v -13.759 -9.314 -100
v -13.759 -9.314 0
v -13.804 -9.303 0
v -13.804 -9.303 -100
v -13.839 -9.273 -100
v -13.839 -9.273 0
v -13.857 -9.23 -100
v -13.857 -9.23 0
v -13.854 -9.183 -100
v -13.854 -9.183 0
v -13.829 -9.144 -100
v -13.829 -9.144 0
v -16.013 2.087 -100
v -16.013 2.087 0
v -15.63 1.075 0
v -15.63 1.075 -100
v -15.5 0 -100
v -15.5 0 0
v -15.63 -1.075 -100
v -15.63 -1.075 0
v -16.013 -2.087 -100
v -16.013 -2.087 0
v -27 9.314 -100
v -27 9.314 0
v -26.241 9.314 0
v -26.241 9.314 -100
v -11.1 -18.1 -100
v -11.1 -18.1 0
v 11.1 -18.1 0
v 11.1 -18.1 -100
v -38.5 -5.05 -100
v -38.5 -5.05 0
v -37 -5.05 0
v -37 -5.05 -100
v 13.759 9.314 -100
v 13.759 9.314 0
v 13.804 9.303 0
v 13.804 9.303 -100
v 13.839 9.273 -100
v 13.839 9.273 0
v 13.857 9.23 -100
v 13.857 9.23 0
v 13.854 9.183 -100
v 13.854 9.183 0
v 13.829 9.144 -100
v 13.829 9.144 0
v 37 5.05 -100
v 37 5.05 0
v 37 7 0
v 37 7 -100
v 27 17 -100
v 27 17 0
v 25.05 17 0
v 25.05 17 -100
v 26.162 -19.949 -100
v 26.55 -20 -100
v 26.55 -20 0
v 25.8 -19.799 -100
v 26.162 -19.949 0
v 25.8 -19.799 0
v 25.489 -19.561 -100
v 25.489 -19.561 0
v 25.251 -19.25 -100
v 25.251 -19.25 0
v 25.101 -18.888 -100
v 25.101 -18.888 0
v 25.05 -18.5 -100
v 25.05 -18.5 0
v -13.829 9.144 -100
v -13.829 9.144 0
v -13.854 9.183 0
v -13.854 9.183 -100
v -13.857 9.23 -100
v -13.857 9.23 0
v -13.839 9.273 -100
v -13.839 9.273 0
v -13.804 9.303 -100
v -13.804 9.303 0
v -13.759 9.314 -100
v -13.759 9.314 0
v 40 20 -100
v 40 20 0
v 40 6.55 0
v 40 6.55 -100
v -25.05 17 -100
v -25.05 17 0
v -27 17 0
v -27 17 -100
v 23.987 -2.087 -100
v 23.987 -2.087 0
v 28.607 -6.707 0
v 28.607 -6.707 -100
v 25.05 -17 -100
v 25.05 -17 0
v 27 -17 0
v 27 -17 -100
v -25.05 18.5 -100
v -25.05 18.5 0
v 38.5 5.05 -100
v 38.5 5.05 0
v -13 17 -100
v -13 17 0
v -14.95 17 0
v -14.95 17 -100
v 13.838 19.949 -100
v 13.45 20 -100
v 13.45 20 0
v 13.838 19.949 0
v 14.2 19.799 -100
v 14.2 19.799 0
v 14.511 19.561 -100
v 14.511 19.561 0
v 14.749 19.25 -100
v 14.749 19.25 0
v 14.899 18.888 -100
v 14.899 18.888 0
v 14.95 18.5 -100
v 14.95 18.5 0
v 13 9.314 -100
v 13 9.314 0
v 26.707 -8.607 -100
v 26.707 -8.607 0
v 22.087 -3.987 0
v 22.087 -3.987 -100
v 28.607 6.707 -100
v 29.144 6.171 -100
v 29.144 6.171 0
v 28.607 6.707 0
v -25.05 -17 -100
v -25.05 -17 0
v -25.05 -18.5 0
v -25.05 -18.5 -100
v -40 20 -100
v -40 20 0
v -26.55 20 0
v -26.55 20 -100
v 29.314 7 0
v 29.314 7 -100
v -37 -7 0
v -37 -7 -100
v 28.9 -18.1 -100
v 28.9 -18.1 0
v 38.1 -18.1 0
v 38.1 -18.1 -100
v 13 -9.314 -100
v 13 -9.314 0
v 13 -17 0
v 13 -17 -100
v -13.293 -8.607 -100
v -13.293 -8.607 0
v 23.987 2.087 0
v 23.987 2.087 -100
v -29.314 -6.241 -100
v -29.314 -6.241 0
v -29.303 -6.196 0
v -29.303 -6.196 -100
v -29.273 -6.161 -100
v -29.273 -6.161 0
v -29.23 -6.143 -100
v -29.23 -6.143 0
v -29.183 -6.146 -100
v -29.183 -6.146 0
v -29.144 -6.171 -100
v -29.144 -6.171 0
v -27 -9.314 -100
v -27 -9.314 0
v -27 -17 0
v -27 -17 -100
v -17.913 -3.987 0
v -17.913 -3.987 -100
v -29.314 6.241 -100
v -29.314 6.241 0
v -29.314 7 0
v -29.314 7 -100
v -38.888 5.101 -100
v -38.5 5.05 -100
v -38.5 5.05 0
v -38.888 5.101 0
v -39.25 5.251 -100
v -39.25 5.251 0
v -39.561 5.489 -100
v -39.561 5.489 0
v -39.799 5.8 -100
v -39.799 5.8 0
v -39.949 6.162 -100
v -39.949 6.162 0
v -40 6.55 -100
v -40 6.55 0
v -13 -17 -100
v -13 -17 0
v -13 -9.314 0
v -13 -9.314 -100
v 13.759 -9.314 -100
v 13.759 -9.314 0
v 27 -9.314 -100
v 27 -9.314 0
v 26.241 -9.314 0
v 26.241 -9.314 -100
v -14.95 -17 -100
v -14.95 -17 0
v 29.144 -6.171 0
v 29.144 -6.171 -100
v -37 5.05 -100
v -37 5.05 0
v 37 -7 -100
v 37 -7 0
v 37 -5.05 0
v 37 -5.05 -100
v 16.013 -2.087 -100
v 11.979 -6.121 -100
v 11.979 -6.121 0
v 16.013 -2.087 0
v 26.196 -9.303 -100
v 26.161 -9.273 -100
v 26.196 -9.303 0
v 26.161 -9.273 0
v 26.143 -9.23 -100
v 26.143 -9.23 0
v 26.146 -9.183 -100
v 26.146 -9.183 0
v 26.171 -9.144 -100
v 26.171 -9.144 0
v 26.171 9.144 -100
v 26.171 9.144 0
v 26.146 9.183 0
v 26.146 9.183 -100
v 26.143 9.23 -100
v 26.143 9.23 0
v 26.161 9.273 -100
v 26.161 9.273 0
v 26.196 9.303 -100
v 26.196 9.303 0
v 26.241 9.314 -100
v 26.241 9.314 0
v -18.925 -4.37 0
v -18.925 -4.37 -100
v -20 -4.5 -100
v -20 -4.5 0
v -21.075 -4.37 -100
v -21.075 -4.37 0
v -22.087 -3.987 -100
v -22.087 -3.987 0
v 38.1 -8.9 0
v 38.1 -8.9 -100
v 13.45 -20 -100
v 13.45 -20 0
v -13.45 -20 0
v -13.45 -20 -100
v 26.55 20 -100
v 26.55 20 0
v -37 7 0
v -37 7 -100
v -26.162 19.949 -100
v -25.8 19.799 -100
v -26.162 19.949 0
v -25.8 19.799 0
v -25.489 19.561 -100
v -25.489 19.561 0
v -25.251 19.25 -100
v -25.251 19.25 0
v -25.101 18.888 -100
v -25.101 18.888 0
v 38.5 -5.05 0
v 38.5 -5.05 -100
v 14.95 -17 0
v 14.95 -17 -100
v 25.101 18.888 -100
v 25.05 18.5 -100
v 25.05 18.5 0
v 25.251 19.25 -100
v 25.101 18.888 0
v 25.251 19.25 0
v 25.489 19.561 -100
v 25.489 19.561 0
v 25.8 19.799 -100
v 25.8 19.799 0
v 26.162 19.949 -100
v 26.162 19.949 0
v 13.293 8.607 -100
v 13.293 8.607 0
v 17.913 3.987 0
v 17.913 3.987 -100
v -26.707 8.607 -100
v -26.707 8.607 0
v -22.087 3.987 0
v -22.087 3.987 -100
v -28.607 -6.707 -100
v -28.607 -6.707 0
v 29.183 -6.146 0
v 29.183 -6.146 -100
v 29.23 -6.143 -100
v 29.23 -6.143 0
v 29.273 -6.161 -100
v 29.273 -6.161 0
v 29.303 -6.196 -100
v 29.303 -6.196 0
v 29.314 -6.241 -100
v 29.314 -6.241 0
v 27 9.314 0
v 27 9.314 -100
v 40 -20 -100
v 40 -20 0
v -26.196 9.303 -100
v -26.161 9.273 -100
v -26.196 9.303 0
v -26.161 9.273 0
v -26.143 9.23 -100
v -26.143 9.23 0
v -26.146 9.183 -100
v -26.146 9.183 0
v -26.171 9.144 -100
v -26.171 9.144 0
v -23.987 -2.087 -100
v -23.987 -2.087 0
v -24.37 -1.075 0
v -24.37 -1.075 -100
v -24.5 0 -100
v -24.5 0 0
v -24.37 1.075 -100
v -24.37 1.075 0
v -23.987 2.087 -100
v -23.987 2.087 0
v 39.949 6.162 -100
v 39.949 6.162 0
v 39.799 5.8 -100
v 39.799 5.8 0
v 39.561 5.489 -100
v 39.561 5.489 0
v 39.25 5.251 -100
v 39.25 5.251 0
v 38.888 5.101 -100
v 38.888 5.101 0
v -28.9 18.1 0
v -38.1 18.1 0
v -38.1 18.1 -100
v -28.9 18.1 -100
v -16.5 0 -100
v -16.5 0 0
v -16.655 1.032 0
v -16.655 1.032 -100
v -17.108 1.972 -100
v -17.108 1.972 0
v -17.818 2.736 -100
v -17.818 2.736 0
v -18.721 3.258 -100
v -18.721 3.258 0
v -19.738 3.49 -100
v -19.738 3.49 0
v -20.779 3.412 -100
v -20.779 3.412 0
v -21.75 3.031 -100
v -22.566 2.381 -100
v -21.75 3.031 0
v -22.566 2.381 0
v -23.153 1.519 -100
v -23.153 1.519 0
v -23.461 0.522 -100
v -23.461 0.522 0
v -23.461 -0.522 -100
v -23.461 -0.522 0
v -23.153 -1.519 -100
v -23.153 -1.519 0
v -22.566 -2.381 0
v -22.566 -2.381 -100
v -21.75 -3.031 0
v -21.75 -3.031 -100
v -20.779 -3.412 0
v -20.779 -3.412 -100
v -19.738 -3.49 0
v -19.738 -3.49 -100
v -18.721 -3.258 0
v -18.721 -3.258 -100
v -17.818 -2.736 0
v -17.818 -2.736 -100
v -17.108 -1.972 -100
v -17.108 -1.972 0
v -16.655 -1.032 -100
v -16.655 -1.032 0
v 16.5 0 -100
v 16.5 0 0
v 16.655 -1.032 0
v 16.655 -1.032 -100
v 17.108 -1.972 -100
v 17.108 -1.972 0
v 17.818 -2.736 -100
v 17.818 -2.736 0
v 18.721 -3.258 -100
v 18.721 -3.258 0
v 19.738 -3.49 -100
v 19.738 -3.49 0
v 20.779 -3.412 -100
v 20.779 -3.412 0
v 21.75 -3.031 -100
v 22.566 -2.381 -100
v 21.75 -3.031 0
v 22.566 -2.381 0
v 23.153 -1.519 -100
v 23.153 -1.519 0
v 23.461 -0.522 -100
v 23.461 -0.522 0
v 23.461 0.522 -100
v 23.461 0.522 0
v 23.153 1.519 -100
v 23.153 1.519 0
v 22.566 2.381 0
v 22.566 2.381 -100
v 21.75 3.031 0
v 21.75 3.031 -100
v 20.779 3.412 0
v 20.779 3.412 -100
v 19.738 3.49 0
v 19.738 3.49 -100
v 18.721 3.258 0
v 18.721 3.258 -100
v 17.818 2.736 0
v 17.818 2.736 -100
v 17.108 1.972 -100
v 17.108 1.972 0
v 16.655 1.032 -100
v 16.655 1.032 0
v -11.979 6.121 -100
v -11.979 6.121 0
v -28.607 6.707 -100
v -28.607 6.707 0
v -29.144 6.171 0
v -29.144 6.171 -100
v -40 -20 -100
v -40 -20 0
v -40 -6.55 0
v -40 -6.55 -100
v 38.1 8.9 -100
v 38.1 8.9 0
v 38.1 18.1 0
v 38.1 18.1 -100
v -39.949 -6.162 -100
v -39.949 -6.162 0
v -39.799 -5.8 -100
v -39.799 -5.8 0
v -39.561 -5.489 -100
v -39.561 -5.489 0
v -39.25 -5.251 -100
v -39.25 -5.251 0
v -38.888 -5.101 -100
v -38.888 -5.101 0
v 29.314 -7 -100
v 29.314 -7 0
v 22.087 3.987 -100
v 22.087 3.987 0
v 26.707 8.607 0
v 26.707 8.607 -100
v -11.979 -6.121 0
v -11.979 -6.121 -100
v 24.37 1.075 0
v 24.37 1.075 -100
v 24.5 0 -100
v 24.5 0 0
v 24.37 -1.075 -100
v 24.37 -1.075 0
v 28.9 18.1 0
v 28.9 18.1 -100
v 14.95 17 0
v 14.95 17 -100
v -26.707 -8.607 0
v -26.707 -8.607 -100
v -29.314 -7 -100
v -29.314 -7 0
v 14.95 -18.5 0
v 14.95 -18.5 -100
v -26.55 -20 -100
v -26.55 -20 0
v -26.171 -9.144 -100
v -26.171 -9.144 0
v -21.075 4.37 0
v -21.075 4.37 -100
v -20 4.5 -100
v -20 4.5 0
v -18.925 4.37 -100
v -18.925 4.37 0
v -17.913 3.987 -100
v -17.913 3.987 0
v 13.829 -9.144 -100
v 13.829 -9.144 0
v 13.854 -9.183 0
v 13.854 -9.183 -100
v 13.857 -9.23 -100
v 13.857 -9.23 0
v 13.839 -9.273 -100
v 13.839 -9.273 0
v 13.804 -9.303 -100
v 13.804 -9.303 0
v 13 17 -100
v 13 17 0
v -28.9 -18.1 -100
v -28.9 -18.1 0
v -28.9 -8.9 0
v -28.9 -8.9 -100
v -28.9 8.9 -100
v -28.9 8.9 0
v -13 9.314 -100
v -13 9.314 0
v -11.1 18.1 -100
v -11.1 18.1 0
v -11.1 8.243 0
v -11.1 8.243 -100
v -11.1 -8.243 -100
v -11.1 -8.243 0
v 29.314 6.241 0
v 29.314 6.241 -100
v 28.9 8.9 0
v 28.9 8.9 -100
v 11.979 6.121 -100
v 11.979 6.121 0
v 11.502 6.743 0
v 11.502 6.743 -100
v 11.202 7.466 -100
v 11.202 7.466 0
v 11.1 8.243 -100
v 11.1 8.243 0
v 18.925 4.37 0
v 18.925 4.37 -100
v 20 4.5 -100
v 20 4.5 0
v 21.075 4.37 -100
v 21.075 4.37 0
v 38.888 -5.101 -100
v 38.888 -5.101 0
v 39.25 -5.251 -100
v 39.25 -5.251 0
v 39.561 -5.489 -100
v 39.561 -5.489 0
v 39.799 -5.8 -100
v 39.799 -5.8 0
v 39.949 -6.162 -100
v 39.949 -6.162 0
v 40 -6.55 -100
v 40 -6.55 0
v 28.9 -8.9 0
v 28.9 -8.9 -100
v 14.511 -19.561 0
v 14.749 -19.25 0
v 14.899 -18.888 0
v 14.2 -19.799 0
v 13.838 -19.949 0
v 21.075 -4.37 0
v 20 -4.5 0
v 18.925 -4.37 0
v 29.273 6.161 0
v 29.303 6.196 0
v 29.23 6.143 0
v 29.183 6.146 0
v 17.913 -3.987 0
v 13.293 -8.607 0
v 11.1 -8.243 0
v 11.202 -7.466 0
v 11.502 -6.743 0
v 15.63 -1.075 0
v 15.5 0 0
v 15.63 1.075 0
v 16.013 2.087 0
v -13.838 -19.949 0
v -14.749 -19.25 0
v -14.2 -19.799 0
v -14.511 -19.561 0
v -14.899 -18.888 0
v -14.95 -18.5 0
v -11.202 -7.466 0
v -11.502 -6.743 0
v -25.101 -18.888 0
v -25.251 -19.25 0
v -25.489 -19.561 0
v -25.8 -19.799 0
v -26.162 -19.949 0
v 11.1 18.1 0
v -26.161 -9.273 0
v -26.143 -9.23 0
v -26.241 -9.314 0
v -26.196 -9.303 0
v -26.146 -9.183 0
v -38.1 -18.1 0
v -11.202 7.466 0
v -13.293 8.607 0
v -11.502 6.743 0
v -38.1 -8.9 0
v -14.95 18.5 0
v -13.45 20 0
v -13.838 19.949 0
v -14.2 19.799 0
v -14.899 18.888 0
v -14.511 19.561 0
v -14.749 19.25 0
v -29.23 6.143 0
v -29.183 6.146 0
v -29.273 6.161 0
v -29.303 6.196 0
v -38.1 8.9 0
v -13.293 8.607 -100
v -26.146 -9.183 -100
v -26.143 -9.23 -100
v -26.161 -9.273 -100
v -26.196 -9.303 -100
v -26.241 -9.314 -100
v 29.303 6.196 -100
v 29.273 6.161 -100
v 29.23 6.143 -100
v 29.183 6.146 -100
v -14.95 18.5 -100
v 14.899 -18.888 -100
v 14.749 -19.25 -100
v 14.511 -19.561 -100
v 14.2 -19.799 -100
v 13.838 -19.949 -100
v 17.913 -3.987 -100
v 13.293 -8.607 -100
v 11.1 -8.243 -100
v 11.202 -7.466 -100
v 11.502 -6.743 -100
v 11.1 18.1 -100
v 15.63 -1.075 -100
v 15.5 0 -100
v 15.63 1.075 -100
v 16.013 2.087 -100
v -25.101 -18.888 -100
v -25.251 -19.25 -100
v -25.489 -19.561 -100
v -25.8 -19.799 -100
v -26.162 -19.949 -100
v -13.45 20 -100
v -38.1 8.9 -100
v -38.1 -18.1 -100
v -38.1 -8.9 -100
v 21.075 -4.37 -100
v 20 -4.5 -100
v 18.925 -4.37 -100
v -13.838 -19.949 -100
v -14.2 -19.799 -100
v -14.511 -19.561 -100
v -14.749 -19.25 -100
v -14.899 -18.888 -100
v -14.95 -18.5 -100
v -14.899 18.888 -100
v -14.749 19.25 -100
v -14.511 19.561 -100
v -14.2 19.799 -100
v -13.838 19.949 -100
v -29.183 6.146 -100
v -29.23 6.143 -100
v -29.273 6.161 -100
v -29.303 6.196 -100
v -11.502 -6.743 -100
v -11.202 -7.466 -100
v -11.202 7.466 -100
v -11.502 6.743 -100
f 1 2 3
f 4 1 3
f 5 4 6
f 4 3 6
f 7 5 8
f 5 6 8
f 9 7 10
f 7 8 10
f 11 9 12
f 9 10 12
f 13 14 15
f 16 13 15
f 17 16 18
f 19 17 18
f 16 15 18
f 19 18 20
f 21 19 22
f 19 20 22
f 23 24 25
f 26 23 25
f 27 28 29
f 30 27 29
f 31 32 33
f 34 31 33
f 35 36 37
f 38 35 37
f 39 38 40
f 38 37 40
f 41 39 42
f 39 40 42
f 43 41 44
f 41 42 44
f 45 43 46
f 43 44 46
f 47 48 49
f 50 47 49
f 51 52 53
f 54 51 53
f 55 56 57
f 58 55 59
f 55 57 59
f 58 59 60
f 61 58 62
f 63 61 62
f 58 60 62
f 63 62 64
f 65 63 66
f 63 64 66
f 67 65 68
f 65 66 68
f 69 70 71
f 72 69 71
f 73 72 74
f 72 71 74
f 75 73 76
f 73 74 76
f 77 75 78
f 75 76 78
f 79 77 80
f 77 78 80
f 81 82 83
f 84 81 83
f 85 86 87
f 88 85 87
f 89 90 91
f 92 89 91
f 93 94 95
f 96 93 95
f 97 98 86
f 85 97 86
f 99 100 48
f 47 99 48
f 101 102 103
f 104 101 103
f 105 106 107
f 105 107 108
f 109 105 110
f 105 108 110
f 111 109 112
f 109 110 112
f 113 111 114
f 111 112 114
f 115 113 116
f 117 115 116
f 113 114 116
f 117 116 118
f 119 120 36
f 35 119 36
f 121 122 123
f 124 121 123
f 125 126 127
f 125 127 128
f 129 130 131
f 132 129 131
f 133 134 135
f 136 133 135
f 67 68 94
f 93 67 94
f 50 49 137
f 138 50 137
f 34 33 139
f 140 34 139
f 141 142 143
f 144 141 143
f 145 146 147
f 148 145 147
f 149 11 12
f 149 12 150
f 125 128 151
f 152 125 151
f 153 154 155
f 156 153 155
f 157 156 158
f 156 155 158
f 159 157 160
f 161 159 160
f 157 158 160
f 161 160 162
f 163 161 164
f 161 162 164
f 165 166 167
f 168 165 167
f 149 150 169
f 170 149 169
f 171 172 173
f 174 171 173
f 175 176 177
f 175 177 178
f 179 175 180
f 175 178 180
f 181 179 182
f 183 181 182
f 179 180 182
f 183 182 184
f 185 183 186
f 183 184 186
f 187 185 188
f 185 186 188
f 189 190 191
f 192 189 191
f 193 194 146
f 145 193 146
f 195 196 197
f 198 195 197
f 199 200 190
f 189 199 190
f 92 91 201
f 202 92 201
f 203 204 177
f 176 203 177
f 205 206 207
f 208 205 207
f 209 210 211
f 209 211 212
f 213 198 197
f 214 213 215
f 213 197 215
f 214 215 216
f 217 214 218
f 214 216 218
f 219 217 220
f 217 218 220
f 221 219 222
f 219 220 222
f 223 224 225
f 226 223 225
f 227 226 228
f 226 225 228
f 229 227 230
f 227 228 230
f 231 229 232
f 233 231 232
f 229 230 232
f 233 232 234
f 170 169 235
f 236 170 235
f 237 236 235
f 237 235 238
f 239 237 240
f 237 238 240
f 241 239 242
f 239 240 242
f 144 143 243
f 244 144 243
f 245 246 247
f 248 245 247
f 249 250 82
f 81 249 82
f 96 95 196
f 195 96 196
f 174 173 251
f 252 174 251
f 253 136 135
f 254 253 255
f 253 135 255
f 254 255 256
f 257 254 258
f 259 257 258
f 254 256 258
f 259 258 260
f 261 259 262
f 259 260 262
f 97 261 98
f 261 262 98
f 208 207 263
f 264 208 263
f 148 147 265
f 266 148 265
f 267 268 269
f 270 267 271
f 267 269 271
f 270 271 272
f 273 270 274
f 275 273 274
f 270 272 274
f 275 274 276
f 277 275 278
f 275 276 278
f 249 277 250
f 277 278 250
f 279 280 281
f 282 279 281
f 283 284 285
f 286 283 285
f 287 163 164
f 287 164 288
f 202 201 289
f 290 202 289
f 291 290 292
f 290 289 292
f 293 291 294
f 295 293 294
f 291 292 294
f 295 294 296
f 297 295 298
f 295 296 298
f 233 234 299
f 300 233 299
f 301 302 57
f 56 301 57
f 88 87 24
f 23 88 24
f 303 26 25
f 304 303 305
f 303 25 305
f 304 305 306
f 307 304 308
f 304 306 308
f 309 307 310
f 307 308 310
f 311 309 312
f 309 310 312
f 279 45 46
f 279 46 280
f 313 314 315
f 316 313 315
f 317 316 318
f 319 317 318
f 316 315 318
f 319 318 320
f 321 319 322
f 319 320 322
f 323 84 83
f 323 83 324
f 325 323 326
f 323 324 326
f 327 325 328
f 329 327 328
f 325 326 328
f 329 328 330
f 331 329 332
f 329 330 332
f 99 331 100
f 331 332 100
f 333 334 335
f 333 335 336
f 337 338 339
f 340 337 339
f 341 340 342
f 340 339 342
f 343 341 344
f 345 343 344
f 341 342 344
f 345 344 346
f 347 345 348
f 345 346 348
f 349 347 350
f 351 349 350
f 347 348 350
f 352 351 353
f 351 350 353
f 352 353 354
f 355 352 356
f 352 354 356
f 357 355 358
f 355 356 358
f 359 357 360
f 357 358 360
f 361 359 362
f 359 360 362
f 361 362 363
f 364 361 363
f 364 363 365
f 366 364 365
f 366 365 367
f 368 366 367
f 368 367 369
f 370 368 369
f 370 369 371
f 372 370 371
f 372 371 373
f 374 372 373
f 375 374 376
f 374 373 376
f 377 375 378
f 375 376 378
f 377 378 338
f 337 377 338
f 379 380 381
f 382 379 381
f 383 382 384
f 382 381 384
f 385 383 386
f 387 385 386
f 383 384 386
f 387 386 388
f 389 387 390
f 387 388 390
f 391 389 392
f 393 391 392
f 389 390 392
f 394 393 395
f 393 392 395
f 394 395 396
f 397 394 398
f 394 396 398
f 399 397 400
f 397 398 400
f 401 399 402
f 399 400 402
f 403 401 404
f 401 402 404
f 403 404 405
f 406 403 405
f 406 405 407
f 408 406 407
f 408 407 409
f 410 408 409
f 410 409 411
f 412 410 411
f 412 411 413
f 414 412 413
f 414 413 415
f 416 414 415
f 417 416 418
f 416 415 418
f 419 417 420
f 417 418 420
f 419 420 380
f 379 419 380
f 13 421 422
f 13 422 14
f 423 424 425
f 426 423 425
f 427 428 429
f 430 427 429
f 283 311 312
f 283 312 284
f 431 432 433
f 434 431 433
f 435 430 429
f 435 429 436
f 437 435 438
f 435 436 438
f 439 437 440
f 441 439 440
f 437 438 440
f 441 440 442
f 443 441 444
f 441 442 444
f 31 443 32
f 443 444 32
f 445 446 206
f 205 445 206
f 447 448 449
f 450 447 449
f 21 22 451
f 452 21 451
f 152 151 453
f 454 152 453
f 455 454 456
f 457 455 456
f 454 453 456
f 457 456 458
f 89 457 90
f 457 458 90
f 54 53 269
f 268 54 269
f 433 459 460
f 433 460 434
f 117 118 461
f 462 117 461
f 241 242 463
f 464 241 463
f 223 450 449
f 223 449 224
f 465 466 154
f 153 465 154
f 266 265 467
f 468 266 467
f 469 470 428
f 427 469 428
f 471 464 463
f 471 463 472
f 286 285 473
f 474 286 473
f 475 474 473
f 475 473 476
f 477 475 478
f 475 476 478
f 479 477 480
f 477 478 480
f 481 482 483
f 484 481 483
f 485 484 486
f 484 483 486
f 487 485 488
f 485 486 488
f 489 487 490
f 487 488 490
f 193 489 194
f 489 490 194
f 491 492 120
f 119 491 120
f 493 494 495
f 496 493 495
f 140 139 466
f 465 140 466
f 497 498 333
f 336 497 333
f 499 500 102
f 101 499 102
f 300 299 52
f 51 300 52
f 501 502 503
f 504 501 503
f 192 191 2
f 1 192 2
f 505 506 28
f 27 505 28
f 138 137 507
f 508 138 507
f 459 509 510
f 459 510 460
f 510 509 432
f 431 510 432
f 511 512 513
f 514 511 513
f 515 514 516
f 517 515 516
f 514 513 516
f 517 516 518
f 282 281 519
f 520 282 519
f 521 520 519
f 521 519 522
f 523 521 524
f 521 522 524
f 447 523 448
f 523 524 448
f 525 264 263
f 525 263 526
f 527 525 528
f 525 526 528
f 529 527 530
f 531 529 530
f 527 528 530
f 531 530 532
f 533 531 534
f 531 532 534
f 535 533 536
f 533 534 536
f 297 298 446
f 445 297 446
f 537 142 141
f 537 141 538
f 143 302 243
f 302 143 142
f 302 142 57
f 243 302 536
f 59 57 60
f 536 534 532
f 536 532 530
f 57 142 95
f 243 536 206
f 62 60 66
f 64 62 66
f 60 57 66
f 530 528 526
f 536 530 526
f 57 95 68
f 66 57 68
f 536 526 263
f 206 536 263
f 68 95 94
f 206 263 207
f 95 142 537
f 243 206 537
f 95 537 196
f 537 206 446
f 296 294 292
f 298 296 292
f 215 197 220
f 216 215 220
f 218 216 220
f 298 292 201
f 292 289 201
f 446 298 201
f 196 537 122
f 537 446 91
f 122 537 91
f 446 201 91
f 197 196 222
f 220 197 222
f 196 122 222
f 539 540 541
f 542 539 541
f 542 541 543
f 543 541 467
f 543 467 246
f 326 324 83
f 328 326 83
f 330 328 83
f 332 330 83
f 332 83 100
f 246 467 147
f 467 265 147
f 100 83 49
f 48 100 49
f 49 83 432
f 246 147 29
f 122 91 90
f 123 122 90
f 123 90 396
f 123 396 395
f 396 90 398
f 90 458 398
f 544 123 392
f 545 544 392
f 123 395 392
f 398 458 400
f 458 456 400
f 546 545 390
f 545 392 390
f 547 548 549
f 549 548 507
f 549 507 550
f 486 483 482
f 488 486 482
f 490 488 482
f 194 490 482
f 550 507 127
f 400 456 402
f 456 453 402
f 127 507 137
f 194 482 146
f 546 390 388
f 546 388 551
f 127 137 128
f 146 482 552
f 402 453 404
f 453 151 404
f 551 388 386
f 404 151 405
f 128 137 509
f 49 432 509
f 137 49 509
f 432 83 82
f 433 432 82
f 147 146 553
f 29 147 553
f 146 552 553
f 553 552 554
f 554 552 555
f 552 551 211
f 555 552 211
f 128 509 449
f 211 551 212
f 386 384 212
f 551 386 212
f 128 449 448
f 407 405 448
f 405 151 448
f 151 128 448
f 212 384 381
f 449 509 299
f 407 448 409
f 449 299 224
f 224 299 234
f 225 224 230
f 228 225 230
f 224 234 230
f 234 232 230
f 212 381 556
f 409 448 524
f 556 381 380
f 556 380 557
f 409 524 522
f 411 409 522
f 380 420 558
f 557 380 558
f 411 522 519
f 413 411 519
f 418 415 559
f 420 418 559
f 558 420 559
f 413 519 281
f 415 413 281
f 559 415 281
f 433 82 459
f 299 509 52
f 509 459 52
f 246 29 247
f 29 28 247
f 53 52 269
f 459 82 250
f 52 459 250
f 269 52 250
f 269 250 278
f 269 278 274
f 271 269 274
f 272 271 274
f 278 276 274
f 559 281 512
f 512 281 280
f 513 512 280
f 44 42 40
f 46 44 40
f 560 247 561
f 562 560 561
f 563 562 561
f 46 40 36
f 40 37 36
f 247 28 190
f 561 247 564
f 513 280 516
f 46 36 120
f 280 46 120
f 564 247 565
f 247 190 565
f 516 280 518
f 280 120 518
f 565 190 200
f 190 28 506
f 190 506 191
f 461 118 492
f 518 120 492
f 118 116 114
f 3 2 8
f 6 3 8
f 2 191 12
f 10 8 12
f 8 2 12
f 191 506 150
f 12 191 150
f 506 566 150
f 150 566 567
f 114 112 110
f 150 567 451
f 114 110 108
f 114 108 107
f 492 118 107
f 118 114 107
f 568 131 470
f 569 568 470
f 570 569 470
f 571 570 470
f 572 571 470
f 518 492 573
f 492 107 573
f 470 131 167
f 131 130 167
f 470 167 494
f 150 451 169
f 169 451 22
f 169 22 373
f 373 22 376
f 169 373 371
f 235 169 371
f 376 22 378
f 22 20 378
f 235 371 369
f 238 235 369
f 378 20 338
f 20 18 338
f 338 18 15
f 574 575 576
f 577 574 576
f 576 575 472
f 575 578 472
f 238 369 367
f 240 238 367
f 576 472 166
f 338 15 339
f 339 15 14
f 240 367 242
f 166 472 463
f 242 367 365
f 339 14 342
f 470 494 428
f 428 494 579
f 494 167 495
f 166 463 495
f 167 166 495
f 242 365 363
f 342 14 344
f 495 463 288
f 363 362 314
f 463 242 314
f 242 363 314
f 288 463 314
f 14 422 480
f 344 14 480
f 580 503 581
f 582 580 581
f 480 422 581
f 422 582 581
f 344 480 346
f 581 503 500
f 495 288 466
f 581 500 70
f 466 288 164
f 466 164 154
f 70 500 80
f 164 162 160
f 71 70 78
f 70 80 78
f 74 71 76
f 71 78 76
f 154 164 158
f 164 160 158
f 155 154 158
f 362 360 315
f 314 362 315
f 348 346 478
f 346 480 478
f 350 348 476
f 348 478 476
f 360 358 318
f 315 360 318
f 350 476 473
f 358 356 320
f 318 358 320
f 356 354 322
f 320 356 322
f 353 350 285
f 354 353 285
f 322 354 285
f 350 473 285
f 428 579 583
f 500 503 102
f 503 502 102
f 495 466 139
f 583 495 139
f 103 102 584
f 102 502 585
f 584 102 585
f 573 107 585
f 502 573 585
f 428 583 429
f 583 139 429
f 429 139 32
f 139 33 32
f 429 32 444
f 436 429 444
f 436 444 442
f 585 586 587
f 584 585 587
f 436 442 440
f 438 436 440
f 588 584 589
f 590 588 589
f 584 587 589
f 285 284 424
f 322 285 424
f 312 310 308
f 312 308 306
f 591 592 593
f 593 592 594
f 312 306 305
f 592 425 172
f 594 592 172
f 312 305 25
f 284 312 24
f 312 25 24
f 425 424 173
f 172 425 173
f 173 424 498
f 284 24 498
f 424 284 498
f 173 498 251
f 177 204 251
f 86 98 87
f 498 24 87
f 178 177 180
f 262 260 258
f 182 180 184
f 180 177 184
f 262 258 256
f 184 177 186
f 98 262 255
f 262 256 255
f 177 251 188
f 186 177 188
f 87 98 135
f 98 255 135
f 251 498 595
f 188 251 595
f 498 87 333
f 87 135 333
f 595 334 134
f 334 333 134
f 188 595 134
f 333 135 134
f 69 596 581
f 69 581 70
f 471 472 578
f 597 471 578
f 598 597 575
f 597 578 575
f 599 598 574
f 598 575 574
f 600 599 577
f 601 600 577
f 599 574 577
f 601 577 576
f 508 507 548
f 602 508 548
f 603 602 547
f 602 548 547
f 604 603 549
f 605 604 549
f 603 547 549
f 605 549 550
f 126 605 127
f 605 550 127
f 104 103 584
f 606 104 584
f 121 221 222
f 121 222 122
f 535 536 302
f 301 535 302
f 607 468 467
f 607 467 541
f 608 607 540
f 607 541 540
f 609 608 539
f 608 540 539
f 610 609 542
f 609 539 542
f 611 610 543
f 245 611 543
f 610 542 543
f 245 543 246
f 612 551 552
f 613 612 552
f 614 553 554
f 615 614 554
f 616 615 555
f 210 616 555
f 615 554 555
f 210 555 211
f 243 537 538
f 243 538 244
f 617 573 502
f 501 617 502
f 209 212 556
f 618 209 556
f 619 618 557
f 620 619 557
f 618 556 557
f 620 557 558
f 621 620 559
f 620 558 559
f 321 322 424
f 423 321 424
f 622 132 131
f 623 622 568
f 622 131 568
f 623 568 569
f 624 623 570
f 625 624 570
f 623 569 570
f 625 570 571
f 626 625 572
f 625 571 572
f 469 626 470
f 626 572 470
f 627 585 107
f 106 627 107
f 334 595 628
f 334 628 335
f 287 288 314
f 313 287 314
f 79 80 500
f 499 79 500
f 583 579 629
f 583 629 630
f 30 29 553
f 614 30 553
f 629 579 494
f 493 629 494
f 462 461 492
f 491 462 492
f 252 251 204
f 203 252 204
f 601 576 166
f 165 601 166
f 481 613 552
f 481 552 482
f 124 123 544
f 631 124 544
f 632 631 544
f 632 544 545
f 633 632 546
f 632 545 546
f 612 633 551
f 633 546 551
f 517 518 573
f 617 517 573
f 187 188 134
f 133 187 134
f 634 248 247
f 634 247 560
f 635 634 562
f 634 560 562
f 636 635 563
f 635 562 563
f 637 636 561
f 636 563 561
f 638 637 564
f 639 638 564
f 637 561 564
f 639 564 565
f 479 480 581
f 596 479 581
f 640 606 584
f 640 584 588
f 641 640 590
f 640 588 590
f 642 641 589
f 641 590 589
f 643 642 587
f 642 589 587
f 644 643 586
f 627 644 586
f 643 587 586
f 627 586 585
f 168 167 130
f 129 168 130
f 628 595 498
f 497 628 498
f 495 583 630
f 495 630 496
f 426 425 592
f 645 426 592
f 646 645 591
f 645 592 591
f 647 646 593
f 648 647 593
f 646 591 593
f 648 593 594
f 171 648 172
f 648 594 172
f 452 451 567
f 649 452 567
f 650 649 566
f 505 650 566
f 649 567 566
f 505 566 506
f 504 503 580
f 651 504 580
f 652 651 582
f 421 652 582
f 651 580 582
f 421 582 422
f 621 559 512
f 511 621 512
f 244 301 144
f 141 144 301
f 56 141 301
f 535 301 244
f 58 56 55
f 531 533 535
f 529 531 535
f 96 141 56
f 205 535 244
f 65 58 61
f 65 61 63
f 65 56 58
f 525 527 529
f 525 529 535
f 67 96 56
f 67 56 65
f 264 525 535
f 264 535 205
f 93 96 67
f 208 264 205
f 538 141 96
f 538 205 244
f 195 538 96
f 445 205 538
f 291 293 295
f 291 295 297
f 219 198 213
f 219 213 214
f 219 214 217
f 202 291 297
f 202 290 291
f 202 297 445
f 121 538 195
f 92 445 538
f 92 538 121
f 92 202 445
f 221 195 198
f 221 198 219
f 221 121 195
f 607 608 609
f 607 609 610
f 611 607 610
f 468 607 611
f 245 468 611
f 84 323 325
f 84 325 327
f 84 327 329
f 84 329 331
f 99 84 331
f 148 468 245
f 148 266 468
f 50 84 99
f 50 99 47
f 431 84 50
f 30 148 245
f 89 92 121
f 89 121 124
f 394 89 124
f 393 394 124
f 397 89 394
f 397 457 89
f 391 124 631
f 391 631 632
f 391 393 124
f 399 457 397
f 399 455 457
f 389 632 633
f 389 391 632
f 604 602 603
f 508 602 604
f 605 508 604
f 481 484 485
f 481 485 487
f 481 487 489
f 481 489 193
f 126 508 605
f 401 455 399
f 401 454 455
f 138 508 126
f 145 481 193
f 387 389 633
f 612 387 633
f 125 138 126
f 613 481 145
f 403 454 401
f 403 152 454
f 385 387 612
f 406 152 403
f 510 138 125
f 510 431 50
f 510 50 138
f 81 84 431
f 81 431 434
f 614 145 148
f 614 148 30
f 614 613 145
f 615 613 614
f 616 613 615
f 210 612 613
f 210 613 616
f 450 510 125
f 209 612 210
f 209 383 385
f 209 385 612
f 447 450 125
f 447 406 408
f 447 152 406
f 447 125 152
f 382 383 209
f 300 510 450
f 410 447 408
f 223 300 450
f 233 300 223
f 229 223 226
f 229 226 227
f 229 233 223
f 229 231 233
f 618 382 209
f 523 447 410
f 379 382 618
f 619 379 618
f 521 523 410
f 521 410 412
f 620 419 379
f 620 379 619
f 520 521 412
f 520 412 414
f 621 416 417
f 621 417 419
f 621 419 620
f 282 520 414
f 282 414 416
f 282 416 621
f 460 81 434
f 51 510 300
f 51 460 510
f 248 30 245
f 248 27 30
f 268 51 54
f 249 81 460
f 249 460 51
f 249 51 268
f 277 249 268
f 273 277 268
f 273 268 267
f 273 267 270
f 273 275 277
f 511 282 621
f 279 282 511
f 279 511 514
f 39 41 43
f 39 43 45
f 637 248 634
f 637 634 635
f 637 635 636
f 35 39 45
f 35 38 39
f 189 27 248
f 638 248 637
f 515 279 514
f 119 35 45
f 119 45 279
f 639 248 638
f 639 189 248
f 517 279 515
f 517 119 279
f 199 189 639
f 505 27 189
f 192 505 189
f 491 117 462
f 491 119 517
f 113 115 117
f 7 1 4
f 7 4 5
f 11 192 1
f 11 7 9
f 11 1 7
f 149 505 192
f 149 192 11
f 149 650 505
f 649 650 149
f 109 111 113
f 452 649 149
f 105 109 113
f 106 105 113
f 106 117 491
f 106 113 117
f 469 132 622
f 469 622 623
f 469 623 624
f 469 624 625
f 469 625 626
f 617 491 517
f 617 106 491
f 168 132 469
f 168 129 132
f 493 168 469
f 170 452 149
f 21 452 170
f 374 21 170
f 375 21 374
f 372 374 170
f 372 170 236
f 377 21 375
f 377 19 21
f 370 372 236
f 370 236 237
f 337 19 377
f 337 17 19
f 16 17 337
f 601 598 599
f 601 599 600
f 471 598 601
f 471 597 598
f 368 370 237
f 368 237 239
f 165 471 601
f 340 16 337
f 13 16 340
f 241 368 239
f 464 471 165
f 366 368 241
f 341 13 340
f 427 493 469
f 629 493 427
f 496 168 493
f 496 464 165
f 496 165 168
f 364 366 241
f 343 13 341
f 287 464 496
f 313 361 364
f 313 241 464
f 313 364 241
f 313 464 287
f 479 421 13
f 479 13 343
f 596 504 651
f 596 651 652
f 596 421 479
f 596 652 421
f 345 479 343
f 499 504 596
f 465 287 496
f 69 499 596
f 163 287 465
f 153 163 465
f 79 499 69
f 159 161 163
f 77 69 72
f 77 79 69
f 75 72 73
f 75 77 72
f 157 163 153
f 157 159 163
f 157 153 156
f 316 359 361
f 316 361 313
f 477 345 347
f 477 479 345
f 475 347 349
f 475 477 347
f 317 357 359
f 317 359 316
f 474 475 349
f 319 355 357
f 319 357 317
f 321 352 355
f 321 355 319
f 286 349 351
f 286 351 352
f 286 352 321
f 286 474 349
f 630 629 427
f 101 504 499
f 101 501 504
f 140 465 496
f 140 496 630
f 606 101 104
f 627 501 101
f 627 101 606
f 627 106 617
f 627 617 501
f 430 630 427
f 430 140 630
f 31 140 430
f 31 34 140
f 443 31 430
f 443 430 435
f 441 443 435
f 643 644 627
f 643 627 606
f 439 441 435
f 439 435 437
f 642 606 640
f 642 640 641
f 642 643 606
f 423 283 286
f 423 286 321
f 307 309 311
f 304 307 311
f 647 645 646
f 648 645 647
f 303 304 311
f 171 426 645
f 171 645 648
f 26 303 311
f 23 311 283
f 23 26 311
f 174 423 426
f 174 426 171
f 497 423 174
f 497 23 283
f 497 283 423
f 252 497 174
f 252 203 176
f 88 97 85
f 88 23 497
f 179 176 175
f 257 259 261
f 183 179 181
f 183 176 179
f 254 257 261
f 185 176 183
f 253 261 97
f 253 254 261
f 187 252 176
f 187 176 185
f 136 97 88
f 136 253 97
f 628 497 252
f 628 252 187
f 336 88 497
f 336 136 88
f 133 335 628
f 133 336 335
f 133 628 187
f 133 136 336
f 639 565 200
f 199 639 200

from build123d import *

# Parameters (mm, degrees)
SKETCH_1_R      = 3.5
SKETCH_1_W      = 9.2
SKETCH_1_H      = 9.2
EXTRUDE_3_DEPTH = 100


with BuildPart() as part:
    # 草图1 → 凸台-拉伸3 (new body)
    with BuildSketch(Plane.XY):
        with BuildLine():
            Line((-27, 17), (-27, 9.314213562))
            Line((-27, 9.314213562), (-26.241421356, 9.314213562))
            ThreePointArc((-26.241421356, 9.314213562), (-26.149033403, 9.252481906), (-26.170710678, 9.143502884))
            Line((-26.170710678, 9.143502884), (-26.707106781, 8.607106781))
            Line((-26.707106781, 8.607106781), (-22.086856928, 3.986856928))
            ThreePointArc((-22.086856928, 3.986856928), (-20, 4.5), (-17.913143072, 3.986856928))
            Line((-17.913143072, 3.986856928), (-13.292893219, 8.607106781))
            Line((-13.292893219, 8.607106781), (-13.829289322, 9.143502884))
            ThreePointArc((-13.829289322, 9.143502884), (-13.850966597, 9.252481906), (-13.758578644, 9.314213562))
            Line((-13.758578644, 9.314213562), (-13, 9.314213562))
            Line((-13, 9.314213562), (-13, 17))
            Line((-13, 17), (-14.95, 17))
            Line((-14.95, 17), (-14.95, 18.5))
            ThreePointArc((-14.95, 18.5), (-14.510660172, 19.560660172), (-13.45, 20))
            Line((-13.45, 20), (13.45, 20))
            ThreePointArc((13.45, 20), (14.510660172, 19.560660172), (14.95, 18.5))
            Line((14.95, 18.5), (14.95, 17))
            Line((14.95, 17), (13, 17))
            Line((13, 17), (13, 9.314213562))
            Line((13, 9.314213562), (13.758578644, 9.314213562))
            ThreePointArc((13.758578644, 9.314213562), (13.850966597, 9.252481906), (13.829289322, 9.143502884))
            Line((13.829289322, 9.143502884), (13.292893219, 8.607106781))
            Line((13.292893219, 8.607106781), (17.913143072, 3.986856928))
            ThreePointArc((17.913143072, 3.986856928), (20, 4.5), (22.086856928, 3.986856928))
            Line((22.086856928, 3.986856928), (26.707106781, 8.607106781))
            Line((26.707106781, 8.607106781), (26.170710678, 9.143502884))
            ThreePointArc((26.170710678, 9.143502884), (26.149033403, 9.252481906), (26.241421356, 9.314213562))
            Line((26.241421356, 9.314213562), (27, 9.314213562))
            Line((27, 9.314213562), (27, 17))
            Line((27, 17), (25.05, 17))
            Line((25.05, 17), (25.05, 18.5))
            ThreePointArc((25.05, 18.5), (25.489339828, 19.560660172), (26.55, 20))
            Line((26.55, 20), (40, 20))
            Line((40, 20), (40, 6.55))
            ThreePointArc((40, 6.55), (39.560660172, 5.489339828), (38.5, 5.05))
            Line((38.5, 5.05), (37, 5.05))
            Line((37, 5.05), (37, 7))
            Line((37, 7), (29.314213562, 7))
            Line((29.314213562, 7), (29.314213562, 6.241421356))
            ThreePointArc((29.314213562, 6.241421356), (29.252481906, 6.149033403), (29.143502884, 6.170710678))
            Line((29.143502884, 6.170710678), (28.607106781, 6.707106781))
            Line((28.607106781, 6.707106781), (23.986856928, 2.086856928))
            ThreePointArc((23.986856928, 2.086856928), (24.5, 0), (23.986856928, -2.086856928))
            Line((23.986856928, -2.086856928), (28.607106781, -6.707106781))
            Line((28.607106781, -6.707106781), (29.143502884, -6.170710678))
            ThreePointArc((29.143502884, -6.170710678), (29.252481906, -6.149033403), (29.314213562, -6.241421356))
            Line((29.314213562, -6.241421356), (29.314213562, -7))
            Line((29.314213562, -7), (37, -7))
            Line((37, -7), (37, -5.05))
            Line((37, -5.05), (38.5, -5.05))
            ThreePointArc((38.5, -5.05), (39.560660172, -5.489339828), (40, -6.55))
            Line((40, -6.55), (40, -20))
            Line((40, -20), (26.55, -20))
            ThreePointArc((26.55, -20), (25.489339828, -19.560660172), (25.05, -18.5))
            Line((25.05, -18.5), (25.05, -17))
            Line((25.05, -17), (27, -17))
            Line((27, -17), (27, -9.314213562))
            Line((27, -9.314213562), (26.241421356, -9.314213562))
            ThreePointArc((26.241421356, -9.314213562), (26.149033403, -9.252481906), (26.170710678, -9.143502884))
            Line((26.170710678, -9.143502884), (26.707106781, -8.607106781))
            Line((26.707106781, -8.607106781), (22.086856928, -3.986856928))
            ThreePointArc((22.086856928, -3.986856928), (20, -4.5), (17.913143072, -3.986856928))
            Line((17.913143072, -3.986856928), (13.292893219, -8.607106781))
            Line((13.292893219, -8.607106781), (13.829289322, -9.143502884))
            ThreePointArc((13.829289322, -9.143502884), (13.850966597, -9.252481906), (13.758578644, -9.314213562))
            Line((13.758578644, -9.314213562), (13, -9.314213562))
            Line((13, -9.314213562), (13, -17))
            Line((13, -17), (14.95, -17))
            Line((14.95, -17), (14.95, -18.5))
            ThreePointArc((14.95, -18.5), (14.510660172, -19.560660172), (13.45, -20))
            Line((13.45, -20), (-13.45, -20))
            ThreePointArc((-13.45, -20), (-14.510660172, -19.560660172), (-14.95, -18.5))
            Line((-14.95, -18.5), (-14.95, -17))
            Line((-14.95, -17), (-13, -17))
            Line((-13, -17), (-13, -9.314213562))
            Line((-13, -9.314213562), (-13.758578644, -9.314213562))
            ThreePointArc((-13.758578644, -9.314213562), (-13.850966597, -9.252481906), (-13.829289322, -9.143502884))
            Line((-13.829289322, -9.143502884), (-13.292893219, -8.607106781))
            Line((-13.292893219, -8.607106781), (-17.913143072, -3.986856928))
            ThreePointArc((-17.913143072, -3.986856928), (-20, -4.5), (-22.086856928, -3.986856928))
            Line((-22.086856928, -3.986856928), (-26.707106781, -8.607106781))
            Line((-26.707106781, -8.607106781), (-26.170710678, -9.143502884))
            ThreePointArc((-26.170710678, -9.143502884), (-26.149033403, -9.252481906), (-26.241421356, -9.314213562))
            Line((-26.241421356, -9.314213562), (-27, -9.314213562))
            Line((-27, -9.314213562), (-27, -17))
            Line((-27, -17), (-25.05, -17))
            Line((-25.05, -17), (-25.05, -18.5))
            ThreePointArc((-25.05, -18.5), (-25.489339828, -19.560660172), (-26.55, -20))
            Line((-26.55, -20), (-40, -20))
            Line((-40, -20), (-40, -6.55))
            ThreePointArc((-40, -6.55), (-39.560660172, -5.489339828), (-38.5, -5.05))
            Line((-38.5, -5.05), (-37, -5.05))
            Line((-37, -5.05), (-37, -7))
            Line((-37, -7), (-29.314213562, -7))
            Line((-29.314213562, -7), (-29.314213562, -6.241421356))
            ThreePointArc((-29.314213562, -6.241421356), (-29.252481906, -6.149033403), (-29.143502884, -6.170710678))
            Line((-29.143502884, -6.170710678), (-28.607106781, -6.707106781))
            Line((-28.607106781, -6.707106781), (-23.986856928, -2.086856928))
            ThreePointArc((-23.986856928, -2.086856928), (-24.5, 0), (-23.986856928, 2.086856928))
            Line((-23.986856928, 2.086856928), (-28.607106781, 6.707106781))
            Line((-28.607106781, 6.707106781), (-29.143502884, 6.170710678))
            ThreePointArc((-29.143502884, 6.170710678), (-29.252481906, 6.149033403), (-29.314213562, 6.241421356))
            Line((-29.314213562, 6.241421356), (-29.314213562, 7))
            Line((-29.314213562, 7), (-37, 7))
            Line((-37, 7), (-37, 5.05))
            Line((-37, 5.05), (-38.5, 5.05))
            ThreePointArc((-38.5, 5.05), (-39.560660172, 5.489339828), (-40, 6.55))
            Line((-40, 6.55), (-40, 20))
            Line((-40, 20), (-26.55, 20))
            ThreePointArc((-26.55, 20), (-25.489339828, 19.560660172), (-25.05, 18.5))
            Line((-25.05, 18.5), (-25.05, 17))
            Line((-25.05, 17), (-27, 17))
        make_face()
        with Locations((-20, 0)):
            Circle(SKETCH_1_R, mode=Mode.SUBTRACT)
        with Locations(Location((20, 0, 0), (0, 0, 180))):
            Circle(SKETCH_1_R, mode=Mode.SUBTRACT)
        with Locations((-33.5, 13.5)):
            Rectangle(SKETCH_1_W, SKETCH_1_H, mode=Mode.SUBTRACT)
        with BuildLine():
            Line((-11.978679656, 6.121320344), (-16.013143072, 2.086856928))
            ThreePointArc((-16.013143072, 2.086856928), (-15.5, 0), (-16.013143072, -2.086856928))
            Line((-16.013143072, -2.086856928), (-11.978679656, -6.121320344))
            ThreePointArc((-11.978679656, -6.121320344), (-11.328361402, -7.09459039), (-11.1, -8.242640687))
            Line((-11.1, -8.242640687), (-11.1, -18.1))
            Line((-11.1, -18.1), (11.1, -18.1))
            Line((11.1, -18.1), (11.1, -8.242640687))
            ThreePointArc((11.1, -8.242640687), (11.328361402, -7.09459039), (11.978679656, -6.121320344))
            Line((11.978679656, -6.121320344), (16.013143072, -2.086856928))
            ThreePointArc((16.013143072, -2.086856928), (15.5, 0), (16.013143072, 2.086856928))
            Line((16.013143072, 2.086856928), (11.978679656, 6.121320344))
            ThreePointArc((11.978679656, 6.121320344), (11.328361402, 7.09459039), (11.1, 8.242640687))
            Line((11.1, 8.242640687), (11.1, 18.1))
            Line((11.1, 18.1), (-11.1, 18.1))
            Line((-11.1, 18.1), (-11.1, 8.242640687))
            ThreePointArc((-11.1, 8.242640687), (-11.328361402, 7.09459039), (-11.978679656, 6.121320344))
        make_face(mode=Mode.SUBTRACT)
        with Locations((-33.5, -13.5)):
            Rectangle(SKETCH_1_W, SKETCH_1_H, mode=Mode.SUBTRACT)
        with Locations((33.5, -13.5)):
            Rectangle(SKETCH_1_W, SKETCH_1_H, mode=Mode.SUBTRACT)
        with Locations((33.5, 13.5)):
            Rectangle(SKETCH_1_W, SKETCH_1_H, mode=Mode.SUBTRACT)
    extrude(amount=-EXTRUDE_3_DEPTH)


solid = part.part
